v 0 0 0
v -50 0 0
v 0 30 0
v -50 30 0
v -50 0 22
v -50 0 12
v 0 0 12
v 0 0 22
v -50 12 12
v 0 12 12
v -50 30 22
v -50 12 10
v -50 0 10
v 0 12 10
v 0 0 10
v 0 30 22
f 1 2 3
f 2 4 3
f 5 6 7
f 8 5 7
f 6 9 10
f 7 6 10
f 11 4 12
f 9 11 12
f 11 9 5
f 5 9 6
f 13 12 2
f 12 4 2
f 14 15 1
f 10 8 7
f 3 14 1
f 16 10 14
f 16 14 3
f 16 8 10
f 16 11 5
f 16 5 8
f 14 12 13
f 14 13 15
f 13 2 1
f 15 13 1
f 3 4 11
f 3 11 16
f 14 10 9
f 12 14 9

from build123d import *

# Parameters (mm, degrees)
F0_W     = 30
F0_H     = 30
F0_W_2   = 50
F1_DEPTH = 12
F2_W     = 12
F2_H     = 30
F2_H_2   = 12
F2_W_2   = 50
F3_DEPTH = 3.5
F4_W     = 50
F4_H     = 12
F4_W_2   = 12
F4_H_2   = 30
F4_H_3   = 18
F4_W_3   = 18
F5_DEPTH = 10
F6_DEPTH = 10
F7_W     = 30
F7_H     = 65.1035520434
F8_DEPTH = 25


with BuildPart() as f1:
    # F0 (on Top) → F1 (new body)
    with BuildSketch(Plane.XY):
        with Locations((15, -15)):
            Rectangle(F0_W, F0_H)
        with BuildLine():
            Line((0, 30), (0, 0))
            Line((0, 0), (30, 0))
            Line((30, 0), (16.1747587326, 13.8252412674))
            ThreePointArc((16.1747587326, 13.8252412674), (12.3110554274, 14.8605174478), (11.275779247, 18.724220753))
            Line((11.275779247, 18.724220753), (0, 30))
        make_face()
        with Locations((-25, 15)):
            Rectangle(F0_W_2, F0_H)
    extrude(amount=F1_DEPTH)

    # F2 (on face) → F3 (cut)
    with BuildSketch(Plane.XY.offset(12)):
        with Locations((6, -15)):
            Rectangle(F2_W, F2_H)
        with Locations((6, 6)):
            Rectangle(F2_W, F2_H_2)
        with Locations((-25, 6)):
            Rectangle(F2_W_2, F2_H_2)
    extrude(amount=-F3_DEPTH, mode=Mode.SUBTRACT)

    # F4 (on face) → F5 (join)
    with BuildSketch(Plane.XY.offset(12)):
        with Locations((-25, 6)):
            Rectangle(F4_W, F4_H)
        with Locations((6, -15)):
            Rectangle(F4_W_2, F4_H_2)
        with BuildLine():
            Line((11.275779247, 18.724220753), (0, 30))
            Line((0, 30), (0, 12))
            Line((0, 12), (12, 12))
            Line((12, 12), (12, 0))
            Line((12, 0), (30, 0))
            Line((30, 0), (16.1747587326, 13.8252412674))
            ThreePointArc((16.1747587326, 13.8252412674), (12.3110554274, 14.8605174478), (11.275779247, 18.724220753))
        make_face()
        with Locations((6, 6)):
            Rectangle(F4_W_2, F4_H)
        with Locations((-25, 21)):
            Rectangle(F4_W, F4_H_3)
        with Locations((21, -15)):
            Rectangle(F4_W_3, F4_H_2)
    extrude(amount=F5_DEPTH)

    # F0 (on Top) → F6 (join)
    with BuildSketch(Plane.XY):
        with Locations((-25, 15)):
            Rectangle(F0_W_2, F0_H)
        with BuildLine():
            Line((0, 30), (0, 0))
            Line((0, 0), (30, 0))
            Line((30, 0), (16.1747587326, 13.8252412674))
            ThreePointArc((16.1747587326, 13.8252412674), (12.3110554274, 14.8605174478), (11.275779247, 18.724220753))
            Line((11.275779247, 18.724220753), (0, 30))
        make_face()
        with Locations((15, -15)):
            Rectangle(F0_W, F0_H)
        with BuildLine():
            ThreePointArc((19.1394825522, 17.6889445726), (15.6615873211, 21.6547240181), (11.275779247, 18.724220753))
            Line((11.275779247, 18.724220753), (13.7252689898, 16.2747310102))
            Line((13.7252689898, 16.2747310102), (16.1747587326, 13.8252412674))
            ThreePointArc((16.1747587326, 13.8252412674), (18.3128959133, 15.2538988565), (19.1394825522, 17.6889445726))
        make_face()
        with BuildLine():
            ThreePointArc((17.1394825522, 17.6889445726), (15.9048494169, 15.8411855075), (13.7252689898, 16.2747310102))
            ThreePointArc((13.7252689898, 16.2747310102), (14.3741156874, 19.5367036376), (17.1394825522, 17.6889445726))
        make_face(mode=Mode.SUBTRACT)
        with BuildLine():
            Line((13.7252689898, 16.2747310102), (11.275779247, 18.724220753))
            ThreePointArc((11.275779247, 18.724220753), (12.3110554274, 14.8605174478), (16.1747587326, 13.8252412674))
            Line((16.1747587326, 13.8252412674), (13.7252689898, 16.2747310102))
        make_face()
    extrude(amount=F6_DEPTH)

    # F7 (on face) → F8 (cut)
    with BuildSketch(Plane.XY.offset(22)):
        with Locations((15, -2.5517760217)):
            Rectangle(F7_W, F7_H)
    extrude(amount=-F8_DEPTH, mode=Mode.SUBTRACT)


solid = f1.part
